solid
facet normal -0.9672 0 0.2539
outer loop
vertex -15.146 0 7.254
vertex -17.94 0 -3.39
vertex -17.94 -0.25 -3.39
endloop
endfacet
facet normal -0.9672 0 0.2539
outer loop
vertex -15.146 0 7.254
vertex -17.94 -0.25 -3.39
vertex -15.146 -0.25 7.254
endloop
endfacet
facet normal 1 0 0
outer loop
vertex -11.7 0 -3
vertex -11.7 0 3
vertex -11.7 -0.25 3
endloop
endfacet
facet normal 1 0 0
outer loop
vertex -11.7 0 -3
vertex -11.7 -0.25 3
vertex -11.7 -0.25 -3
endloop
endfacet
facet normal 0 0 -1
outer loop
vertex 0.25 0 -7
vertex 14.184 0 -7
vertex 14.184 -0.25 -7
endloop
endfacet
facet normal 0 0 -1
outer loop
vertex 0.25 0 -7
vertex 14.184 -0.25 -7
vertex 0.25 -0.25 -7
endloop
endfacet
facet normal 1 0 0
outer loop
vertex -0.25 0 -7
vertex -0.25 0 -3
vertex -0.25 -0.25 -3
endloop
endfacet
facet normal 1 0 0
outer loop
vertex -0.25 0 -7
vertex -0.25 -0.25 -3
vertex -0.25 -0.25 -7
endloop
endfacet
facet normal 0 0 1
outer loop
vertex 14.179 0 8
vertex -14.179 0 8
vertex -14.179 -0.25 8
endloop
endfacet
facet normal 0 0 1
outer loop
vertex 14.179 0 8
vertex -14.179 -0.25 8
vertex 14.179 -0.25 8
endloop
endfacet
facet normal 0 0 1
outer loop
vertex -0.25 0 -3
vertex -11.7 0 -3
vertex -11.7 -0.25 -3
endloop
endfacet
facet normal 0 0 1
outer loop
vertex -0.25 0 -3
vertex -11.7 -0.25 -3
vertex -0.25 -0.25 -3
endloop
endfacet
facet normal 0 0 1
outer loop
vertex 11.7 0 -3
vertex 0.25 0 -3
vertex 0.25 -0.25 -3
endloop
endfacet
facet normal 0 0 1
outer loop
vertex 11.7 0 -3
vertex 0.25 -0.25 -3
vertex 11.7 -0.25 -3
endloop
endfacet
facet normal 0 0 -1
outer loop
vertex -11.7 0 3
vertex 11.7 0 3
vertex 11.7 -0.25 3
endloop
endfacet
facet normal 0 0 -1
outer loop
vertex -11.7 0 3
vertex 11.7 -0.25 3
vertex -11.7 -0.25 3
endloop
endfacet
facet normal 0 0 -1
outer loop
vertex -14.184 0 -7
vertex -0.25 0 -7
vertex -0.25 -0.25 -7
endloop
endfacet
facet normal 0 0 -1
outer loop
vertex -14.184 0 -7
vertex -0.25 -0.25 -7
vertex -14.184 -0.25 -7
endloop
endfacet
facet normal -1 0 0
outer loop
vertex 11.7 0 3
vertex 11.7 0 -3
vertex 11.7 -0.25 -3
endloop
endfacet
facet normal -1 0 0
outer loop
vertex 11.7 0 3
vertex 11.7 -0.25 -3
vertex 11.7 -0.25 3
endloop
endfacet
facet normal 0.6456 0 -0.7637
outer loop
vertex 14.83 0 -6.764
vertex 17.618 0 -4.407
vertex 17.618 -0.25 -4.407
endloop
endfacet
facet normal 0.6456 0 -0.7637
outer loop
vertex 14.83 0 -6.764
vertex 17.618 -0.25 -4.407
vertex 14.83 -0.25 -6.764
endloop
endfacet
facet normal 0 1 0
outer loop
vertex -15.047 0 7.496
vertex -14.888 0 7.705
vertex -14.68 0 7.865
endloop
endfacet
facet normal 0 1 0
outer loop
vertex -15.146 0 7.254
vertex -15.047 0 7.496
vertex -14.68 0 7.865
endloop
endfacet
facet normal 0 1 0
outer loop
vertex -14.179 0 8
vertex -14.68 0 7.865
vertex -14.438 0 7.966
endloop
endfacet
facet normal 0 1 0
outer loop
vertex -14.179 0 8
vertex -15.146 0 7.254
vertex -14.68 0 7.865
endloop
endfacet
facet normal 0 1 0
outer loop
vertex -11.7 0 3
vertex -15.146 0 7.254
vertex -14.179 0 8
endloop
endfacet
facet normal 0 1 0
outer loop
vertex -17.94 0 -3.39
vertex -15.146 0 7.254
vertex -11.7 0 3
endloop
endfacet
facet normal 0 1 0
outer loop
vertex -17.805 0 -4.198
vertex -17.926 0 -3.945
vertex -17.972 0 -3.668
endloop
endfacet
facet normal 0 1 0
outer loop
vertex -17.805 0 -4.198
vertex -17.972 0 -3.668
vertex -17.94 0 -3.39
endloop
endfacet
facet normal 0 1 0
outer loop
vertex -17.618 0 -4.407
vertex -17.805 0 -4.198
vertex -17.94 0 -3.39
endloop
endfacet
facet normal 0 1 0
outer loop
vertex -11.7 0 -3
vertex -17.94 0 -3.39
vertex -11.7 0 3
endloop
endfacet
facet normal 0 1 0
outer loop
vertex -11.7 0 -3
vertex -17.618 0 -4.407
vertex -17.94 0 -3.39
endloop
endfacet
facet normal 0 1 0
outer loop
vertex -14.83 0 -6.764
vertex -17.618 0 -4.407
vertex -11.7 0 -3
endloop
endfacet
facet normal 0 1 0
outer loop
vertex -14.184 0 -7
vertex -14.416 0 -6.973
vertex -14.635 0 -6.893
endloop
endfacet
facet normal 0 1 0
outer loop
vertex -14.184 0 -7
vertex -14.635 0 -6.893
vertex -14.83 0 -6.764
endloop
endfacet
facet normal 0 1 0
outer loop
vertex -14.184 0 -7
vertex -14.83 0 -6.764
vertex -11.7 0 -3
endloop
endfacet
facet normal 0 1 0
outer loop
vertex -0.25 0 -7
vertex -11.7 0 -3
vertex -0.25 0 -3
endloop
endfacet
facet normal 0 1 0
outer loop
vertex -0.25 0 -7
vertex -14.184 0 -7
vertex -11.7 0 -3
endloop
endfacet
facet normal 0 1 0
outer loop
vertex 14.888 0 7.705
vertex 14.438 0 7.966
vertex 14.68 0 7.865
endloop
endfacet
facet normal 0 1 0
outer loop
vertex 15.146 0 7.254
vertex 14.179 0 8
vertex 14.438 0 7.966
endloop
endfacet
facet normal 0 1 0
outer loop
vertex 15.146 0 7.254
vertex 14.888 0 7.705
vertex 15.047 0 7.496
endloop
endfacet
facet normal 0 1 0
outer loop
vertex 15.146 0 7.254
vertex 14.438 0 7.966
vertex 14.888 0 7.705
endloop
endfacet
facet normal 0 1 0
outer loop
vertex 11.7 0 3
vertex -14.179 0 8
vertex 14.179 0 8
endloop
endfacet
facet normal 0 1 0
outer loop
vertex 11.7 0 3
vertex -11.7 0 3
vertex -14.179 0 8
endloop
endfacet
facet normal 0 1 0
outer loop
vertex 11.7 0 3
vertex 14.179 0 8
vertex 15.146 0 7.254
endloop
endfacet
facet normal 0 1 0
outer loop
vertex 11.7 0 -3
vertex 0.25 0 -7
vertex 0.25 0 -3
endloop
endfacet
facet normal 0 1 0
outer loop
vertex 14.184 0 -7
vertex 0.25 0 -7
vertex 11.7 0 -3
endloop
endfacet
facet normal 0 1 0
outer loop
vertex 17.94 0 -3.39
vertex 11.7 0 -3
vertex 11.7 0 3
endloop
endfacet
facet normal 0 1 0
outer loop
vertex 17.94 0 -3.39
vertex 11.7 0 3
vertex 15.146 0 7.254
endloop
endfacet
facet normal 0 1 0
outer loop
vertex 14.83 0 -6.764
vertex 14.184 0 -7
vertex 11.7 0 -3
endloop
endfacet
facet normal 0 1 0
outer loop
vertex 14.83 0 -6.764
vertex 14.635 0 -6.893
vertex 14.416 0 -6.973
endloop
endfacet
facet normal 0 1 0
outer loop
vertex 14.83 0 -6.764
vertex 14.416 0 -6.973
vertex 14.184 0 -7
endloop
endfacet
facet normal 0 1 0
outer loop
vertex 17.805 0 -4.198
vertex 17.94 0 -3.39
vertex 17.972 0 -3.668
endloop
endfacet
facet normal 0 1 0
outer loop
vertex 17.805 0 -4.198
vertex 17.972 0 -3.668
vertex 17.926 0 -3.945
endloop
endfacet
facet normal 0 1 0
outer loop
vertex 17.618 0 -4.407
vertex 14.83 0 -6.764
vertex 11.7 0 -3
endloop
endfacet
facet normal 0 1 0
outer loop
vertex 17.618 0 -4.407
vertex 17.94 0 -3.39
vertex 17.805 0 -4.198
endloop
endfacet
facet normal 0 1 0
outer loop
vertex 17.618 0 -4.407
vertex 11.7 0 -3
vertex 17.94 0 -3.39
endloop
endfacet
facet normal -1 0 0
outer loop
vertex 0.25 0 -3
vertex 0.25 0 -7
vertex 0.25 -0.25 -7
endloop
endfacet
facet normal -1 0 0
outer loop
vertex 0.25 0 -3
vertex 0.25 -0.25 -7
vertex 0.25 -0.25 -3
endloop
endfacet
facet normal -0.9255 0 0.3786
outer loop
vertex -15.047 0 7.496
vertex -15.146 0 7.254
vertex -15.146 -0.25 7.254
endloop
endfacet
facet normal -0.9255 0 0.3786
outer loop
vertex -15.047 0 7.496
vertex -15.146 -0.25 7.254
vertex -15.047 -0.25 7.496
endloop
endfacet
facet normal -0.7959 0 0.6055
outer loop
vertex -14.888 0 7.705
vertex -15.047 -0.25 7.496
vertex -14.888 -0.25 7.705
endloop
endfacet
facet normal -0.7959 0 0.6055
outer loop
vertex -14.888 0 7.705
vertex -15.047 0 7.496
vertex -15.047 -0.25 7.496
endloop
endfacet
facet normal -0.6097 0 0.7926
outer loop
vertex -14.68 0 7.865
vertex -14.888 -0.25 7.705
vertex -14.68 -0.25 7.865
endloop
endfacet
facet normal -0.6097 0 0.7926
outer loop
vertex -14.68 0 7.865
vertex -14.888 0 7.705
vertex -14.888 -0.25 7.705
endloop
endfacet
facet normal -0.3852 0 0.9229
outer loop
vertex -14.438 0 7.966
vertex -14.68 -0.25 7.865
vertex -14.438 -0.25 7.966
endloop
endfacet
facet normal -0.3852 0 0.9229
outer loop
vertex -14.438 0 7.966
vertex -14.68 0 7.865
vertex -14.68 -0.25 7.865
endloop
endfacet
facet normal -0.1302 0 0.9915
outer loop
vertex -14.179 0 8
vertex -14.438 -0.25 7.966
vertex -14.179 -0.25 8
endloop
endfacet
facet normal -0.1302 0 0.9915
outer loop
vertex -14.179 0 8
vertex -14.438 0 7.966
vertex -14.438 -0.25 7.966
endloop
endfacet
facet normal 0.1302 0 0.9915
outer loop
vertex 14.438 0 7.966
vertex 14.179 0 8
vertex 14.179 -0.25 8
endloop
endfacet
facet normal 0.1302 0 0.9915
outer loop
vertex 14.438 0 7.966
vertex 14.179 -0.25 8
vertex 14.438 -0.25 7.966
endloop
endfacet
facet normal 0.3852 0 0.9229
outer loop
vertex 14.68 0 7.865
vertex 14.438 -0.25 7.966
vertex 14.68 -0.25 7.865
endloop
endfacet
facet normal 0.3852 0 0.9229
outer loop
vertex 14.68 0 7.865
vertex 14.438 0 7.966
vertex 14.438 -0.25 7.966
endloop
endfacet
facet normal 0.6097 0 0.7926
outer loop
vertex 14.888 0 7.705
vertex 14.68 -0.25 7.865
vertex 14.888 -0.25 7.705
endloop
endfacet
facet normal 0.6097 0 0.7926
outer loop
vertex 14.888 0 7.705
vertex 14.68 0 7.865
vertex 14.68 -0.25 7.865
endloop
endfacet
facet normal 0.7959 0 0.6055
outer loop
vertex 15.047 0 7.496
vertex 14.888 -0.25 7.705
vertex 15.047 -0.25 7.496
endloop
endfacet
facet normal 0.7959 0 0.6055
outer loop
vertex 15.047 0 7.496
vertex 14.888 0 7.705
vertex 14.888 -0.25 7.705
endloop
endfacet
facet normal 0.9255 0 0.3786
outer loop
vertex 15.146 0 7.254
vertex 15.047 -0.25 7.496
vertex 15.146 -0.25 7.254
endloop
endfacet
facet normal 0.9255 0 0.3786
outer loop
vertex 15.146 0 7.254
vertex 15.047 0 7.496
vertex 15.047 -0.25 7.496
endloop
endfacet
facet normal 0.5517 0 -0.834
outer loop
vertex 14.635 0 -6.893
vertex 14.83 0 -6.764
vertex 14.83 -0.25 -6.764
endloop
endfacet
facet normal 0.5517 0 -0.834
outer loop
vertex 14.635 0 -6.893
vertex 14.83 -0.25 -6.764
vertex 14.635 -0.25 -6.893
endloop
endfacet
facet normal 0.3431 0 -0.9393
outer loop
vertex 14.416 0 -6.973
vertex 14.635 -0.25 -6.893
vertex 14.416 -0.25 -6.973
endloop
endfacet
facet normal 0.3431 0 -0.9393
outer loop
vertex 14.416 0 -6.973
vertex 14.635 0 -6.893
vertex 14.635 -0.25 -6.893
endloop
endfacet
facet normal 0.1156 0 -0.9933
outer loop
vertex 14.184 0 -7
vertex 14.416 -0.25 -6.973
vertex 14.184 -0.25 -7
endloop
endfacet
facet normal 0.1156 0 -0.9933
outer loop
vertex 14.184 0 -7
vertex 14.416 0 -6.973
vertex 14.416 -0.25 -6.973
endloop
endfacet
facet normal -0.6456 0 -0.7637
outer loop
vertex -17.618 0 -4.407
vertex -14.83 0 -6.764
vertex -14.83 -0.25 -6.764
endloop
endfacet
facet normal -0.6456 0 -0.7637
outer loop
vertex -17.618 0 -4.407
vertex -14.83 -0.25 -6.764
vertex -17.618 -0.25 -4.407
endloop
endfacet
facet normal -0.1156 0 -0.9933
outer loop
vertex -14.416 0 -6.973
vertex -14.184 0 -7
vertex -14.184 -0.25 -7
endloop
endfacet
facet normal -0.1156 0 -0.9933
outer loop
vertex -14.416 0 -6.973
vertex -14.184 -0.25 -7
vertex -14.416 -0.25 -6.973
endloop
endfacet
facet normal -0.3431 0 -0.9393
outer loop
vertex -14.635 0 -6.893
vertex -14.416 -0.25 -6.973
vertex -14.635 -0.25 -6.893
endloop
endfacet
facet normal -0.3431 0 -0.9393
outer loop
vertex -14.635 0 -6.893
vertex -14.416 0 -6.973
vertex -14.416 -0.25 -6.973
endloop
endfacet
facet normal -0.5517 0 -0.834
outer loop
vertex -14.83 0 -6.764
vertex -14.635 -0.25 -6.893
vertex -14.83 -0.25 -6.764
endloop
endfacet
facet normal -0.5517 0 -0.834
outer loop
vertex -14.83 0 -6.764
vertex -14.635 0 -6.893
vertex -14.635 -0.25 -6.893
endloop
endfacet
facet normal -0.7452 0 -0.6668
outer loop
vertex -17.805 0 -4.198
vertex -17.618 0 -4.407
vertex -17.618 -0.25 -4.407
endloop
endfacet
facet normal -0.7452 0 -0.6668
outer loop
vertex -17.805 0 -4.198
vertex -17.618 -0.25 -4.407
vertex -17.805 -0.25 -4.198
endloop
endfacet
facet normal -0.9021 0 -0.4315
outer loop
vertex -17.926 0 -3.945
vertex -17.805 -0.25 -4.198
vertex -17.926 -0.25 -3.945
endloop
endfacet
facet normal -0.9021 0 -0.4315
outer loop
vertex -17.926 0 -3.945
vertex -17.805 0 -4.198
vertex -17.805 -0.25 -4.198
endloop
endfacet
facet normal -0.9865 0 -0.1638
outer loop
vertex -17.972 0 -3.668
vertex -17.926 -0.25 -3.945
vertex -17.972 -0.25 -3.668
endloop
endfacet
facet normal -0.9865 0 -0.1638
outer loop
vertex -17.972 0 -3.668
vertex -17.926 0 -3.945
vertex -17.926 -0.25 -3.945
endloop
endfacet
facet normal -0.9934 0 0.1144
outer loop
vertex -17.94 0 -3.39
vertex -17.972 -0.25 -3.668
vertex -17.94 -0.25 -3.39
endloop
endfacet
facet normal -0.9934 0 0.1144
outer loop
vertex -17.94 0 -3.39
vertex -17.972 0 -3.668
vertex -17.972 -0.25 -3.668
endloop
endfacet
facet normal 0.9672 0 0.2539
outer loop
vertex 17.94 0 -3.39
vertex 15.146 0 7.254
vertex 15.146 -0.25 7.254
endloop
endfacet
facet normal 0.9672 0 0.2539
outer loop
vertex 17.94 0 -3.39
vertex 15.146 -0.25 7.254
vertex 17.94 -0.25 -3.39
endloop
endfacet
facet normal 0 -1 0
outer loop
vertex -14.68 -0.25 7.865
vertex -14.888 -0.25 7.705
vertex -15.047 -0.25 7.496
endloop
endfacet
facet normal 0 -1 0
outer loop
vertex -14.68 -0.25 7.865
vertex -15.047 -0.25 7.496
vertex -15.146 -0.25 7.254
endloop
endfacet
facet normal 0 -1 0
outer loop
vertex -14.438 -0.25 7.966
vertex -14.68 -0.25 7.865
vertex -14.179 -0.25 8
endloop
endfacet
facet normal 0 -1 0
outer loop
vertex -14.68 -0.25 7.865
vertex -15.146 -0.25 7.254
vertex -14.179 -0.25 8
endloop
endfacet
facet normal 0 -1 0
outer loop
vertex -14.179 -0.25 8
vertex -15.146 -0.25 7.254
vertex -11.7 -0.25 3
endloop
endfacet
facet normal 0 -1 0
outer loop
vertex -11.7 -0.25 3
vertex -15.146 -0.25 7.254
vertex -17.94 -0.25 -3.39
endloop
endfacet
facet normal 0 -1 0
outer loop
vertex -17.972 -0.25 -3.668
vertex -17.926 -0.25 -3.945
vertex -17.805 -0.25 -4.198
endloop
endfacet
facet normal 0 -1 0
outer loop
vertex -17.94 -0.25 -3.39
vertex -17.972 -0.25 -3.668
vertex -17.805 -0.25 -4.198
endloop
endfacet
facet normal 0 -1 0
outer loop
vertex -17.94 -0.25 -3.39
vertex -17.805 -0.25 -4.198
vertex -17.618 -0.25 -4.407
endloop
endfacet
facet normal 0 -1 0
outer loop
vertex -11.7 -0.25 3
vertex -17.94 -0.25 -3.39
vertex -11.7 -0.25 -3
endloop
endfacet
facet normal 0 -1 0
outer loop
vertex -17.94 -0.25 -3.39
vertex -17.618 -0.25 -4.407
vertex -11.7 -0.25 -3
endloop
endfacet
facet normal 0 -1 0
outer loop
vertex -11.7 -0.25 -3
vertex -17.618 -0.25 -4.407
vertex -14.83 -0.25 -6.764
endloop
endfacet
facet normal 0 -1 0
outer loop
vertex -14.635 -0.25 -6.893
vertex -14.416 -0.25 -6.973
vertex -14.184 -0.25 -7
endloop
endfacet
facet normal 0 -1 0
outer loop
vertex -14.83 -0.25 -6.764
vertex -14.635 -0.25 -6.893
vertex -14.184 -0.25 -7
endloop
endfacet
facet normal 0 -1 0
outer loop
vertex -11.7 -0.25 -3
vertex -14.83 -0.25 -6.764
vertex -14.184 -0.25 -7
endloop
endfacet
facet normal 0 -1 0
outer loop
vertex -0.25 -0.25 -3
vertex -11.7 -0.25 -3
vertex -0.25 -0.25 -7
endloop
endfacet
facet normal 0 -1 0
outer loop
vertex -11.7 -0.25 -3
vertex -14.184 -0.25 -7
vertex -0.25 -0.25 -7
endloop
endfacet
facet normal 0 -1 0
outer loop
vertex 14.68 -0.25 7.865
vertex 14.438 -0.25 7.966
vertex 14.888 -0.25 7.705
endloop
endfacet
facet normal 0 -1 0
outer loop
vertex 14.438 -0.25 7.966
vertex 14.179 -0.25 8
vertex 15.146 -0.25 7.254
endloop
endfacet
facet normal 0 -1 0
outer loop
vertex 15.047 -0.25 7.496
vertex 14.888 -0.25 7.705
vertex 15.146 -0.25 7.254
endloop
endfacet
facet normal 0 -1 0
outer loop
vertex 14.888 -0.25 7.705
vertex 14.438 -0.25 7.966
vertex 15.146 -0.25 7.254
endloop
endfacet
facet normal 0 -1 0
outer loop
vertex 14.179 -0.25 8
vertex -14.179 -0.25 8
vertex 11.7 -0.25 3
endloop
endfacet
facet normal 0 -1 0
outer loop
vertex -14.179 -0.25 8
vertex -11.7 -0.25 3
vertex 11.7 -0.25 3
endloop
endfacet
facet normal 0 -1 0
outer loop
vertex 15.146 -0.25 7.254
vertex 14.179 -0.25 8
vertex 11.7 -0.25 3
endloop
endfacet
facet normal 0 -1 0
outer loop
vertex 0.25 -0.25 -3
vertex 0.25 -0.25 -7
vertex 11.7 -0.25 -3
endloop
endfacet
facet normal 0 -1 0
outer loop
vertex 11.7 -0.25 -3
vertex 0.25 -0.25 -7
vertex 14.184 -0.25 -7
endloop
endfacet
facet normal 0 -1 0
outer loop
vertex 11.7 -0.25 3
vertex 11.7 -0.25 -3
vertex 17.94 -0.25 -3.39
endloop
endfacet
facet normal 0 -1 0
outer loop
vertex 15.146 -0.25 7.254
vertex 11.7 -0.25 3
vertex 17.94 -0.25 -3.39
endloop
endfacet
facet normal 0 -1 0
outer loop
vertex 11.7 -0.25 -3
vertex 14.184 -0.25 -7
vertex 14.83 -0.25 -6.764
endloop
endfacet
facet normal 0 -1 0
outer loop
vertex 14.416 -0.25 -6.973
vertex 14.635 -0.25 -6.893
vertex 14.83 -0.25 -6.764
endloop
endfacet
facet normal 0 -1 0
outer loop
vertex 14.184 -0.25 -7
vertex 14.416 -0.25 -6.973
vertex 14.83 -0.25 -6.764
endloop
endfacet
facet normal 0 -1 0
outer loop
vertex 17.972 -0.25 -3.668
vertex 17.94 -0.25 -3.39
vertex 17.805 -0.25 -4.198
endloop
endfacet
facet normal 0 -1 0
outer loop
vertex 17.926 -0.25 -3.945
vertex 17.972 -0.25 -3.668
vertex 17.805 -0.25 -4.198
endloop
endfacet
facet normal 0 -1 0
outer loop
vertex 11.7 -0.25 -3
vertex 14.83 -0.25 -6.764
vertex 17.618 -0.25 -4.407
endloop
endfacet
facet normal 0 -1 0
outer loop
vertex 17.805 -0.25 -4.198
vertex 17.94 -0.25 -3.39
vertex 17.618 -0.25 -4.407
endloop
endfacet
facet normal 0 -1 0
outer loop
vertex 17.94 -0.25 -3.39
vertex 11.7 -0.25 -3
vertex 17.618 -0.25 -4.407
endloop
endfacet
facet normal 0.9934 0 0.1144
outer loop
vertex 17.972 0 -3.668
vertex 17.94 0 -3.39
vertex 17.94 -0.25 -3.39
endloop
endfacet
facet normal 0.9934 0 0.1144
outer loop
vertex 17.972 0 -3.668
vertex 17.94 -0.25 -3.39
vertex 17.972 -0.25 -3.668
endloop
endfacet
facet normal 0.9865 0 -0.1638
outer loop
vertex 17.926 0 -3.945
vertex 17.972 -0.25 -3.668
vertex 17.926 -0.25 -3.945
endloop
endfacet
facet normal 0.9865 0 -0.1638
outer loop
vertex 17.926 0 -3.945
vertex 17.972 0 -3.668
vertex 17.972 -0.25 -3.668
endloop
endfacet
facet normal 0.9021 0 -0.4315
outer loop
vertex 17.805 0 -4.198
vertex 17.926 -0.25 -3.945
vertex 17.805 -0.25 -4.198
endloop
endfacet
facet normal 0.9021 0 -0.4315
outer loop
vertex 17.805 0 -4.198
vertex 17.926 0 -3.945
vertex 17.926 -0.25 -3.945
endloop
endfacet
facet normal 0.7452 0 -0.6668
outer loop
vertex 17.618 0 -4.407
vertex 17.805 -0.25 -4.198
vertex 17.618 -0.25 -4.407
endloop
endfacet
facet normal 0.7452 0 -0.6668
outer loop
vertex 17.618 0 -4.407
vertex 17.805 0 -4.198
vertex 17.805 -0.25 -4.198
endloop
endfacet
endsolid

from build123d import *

# Parameters (mm, degrees)
BASE_FLANGE1_DEPTH = 0.25


# Sheet-metal steps are written as plain solids
with BuildPart() as part:
    # Sketch1 → Base-Flange1 (new body)
    with BuildSketch(Plane(origin=(0, 0, 0), x_dir=(1, 0, 0), z_dir=(0, 1, 0))):
        with BuildLine():
            Line((-14.178620776, -8), (14.178620776, -8))
            ThreePointArc((14.178620776, -8), (14.789399734, -7.791801152), (15.145851741, -7.253898128))
            Line((15.145851741, -7.253898128), (17.939776994, 3.389626646))
            ThreePointArc((17.939776994, 3.389626646), (17.926022481, 3.944992277), (17.618005902, 4.407318956))
            Line((17.618005902, 4.407318956), (14.829510217, 6.763794182))
            ThreePointArc((14.829510217, 6.763794182), (14.527711383, 6.939093761), (14.184050345, 7))
            Line((14.184050345, 7), (0.25, 7))
            Line((0.25, 7), (0.25, 3))
            Line((0.25, 3), (11.7, 3))
            Line((11.7, 3), (11.7, -3))
            Line((11.7, -3), (-11.7, -3))
            Line((-11.7, -3), (-11.7, 3))
            Line((-11.7, 3), (-0.25, 3))
            Line((-0.25, 3), (-0.25, 7))
            Line((-0.25, 7), (-14.184050345, 7))
            ThreePointArc((-14.184050345, 7), (-14.527711383, 6.939093761), (-14.829510217, 6.763794182))
            Line((-14.829510217, 6.763794182), (-17.618005902, 4.407318956))
            ThreePointArc((-17.618005902, 4.407318956), (-17.926022481, 3.944992277), (-17.939776994, 3.389626646))
            Line((-17.939776994, 3.389626646), (-15.145851741, -7.253898128))
            ThreePointArc((-15.145851741, -7.253898128), (-14.789399734, -7.791801152), (-14.178620776, -8))
        make_face()
    extrude(amount=-BASE_FLANGE1_DEPTH)


solid = part.part
